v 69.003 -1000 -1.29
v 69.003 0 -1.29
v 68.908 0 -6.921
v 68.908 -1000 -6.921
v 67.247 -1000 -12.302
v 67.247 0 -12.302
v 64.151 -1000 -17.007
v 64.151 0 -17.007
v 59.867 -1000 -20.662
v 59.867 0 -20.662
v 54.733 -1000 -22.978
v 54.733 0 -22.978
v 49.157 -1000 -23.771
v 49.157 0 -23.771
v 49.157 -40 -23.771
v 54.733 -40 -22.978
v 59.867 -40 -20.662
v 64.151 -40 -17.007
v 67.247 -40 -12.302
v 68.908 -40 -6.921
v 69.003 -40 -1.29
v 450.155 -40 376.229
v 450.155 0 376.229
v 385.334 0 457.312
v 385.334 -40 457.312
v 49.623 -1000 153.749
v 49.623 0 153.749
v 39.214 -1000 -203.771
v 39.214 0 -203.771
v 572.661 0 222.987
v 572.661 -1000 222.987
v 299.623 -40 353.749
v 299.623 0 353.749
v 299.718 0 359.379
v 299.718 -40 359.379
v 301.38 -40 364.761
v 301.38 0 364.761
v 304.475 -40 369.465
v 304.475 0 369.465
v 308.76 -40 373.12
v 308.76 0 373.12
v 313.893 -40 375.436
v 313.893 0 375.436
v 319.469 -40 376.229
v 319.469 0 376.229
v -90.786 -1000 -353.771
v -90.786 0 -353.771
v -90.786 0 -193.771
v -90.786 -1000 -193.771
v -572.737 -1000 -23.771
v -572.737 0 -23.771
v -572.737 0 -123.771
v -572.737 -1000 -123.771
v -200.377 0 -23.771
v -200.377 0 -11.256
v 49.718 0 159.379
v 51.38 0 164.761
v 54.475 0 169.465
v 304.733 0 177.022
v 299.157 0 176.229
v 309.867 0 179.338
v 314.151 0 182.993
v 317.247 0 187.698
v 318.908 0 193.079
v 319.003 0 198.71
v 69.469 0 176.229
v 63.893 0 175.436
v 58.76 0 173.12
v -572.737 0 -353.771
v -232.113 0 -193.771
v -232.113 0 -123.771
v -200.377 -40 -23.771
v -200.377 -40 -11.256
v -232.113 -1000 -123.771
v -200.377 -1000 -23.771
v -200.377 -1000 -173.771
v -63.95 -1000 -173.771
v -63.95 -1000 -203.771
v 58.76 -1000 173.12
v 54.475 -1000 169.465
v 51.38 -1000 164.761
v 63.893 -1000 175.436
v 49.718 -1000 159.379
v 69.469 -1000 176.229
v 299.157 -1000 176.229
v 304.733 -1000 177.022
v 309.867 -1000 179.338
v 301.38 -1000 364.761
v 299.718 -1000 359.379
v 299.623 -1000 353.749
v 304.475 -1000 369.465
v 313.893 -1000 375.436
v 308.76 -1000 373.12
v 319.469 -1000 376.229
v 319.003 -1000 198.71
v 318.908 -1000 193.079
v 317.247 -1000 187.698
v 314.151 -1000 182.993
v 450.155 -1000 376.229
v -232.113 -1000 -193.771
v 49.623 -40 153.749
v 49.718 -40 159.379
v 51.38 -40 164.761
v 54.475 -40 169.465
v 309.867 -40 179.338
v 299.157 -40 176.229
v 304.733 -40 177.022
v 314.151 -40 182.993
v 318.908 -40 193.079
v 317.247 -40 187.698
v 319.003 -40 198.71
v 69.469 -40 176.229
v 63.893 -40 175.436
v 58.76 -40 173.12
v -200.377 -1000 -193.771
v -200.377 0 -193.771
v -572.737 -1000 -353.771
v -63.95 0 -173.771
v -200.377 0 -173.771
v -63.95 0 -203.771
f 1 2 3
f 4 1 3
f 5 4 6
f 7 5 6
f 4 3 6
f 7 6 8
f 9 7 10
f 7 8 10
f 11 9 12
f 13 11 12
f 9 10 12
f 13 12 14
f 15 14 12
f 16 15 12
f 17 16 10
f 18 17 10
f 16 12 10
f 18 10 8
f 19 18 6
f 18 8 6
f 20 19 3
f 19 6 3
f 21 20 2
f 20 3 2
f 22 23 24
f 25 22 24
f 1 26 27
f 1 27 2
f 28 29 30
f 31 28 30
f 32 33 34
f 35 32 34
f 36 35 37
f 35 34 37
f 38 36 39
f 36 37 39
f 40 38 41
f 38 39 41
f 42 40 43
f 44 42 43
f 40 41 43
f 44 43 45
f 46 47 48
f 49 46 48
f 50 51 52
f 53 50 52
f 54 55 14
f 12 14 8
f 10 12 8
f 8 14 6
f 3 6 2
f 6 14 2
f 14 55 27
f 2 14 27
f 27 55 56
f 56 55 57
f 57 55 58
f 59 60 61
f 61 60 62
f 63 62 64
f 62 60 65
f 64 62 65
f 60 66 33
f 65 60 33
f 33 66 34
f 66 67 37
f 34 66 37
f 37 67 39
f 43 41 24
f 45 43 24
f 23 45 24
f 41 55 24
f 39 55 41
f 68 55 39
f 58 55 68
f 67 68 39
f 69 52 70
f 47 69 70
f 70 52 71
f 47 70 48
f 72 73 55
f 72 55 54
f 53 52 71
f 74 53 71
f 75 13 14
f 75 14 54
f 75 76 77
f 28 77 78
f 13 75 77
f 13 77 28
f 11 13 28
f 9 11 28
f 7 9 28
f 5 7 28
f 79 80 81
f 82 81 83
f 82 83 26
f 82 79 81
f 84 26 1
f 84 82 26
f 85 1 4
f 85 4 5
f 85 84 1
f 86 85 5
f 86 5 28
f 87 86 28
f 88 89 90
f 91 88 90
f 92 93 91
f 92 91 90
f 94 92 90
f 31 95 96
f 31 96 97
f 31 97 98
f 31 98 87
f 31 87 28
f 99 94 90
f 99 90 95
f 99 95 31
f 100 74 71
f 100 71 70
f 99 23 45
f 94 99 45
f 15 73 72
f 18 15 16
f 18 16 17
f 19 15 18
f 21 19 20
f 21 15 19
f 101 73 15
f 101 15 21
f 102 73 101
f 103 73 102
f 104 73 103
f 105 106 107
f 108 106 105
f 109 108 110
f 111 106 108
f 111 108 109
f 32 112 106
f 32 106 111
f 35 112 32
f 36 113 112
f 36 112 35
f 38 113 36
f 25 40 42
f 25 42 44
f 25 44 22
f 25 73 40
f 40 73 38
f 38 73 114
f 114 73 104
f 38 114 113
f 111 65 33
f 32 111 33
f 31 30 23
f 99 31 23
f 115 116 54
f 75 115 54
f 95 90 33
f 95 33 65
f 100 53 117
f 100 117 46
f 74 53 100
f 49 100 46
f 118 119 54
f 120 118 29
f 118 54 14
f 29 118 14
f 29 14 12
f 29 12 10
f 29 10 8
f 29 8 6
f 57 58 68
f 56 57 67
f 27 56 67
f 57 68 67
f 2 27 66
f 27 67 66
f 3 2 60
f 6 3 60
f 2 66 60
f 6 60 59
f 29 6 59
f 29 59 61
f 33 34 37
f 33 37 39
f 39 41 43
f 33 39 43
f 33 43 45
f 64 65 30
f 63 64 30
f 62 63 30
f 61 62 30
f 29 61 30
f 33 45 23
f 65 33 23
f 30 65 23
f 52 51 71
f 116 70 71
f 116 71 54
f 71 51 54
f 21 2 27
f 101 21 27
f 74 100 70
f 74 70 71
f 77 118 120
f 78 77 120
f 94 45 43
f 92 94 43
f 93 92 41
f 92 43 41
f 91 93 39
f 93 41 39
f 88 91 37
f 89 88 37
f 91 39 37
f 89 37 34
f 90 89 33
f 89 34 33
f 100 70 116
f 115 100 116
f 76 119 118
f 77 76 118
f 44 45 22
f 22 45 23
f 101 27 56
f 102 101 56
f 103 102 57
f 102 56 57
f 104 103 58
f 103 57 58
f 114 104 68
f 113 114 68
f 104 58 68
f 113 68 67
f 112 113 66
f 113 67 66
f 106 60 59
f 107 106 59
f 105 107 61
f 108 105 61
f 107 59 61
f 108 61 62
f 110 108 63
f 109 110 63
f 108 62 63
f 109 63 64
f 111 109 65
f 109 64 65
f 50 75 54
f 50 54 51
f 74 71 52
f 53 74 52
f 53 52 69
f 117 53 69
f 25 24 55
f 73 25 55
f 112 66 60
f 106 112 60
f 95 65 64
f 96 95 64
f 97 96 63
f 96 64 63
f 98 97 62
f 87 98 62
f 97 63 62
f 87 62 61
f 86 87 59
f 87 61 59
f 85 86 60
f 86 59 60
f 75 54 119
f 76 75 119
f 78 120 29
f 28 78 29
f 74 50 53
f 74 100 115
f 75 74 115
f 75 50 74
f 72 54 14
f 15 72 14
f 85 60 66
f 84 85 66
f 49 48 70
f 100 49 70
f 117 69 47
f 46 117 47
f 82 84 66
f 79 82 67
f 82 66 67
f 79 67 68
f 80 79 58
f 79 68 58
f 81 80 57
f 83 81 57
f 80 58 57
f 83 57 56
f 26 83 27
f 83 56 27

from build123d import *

# Parameters (mm, degrees)
F0_W     = 481.9511
F0_H     = 50
F1_DEPTH = 1000
F2_DEPTH = 1000
F3_DEPTH = 1000
F4_DEPTH = 40


# Not quite as in the source:
# - ends of sketch curves that miss each other by under 0.0002 mm in the source are joined


with BuildPart() as f1:
    # F0 (on Front) → F1 (new body)
    with BuildSketch(Plane.XZ):
        Polygon((-90.785567, -193.770768), (-200.376776, -193.770768), (-232.113212, -193.770768), (-232.113212, -123.770768), (-572.736667, -123.770768), (-572.736667, -303.770768), (-90.785567, -303.770768), align=None)
        with Locations((-331.761117, -328.770768)):
            Rectangle(F0_W, F0_H)
    extrude(amount=F1_DEPTH)


with BuildPart() as f2:
    # F0 (on Front) → F2 (new body)
    with BuildSketch(Plane.XZ):
        Polygon((-200.376776, -173.770768), (-200.376776, -23.770768), (-572.736667, -23.770768), (-572.736667, -123.770768), (-232.113212, -123.770768), (-232.113212, -193.770768), (-200.376776, -193.770768), align=None)
    extrude(amount=F2_DEPTH)


with BuildPart() as f3:
    # F0 (on Front) → F3 (new body)
    with BuildSketch(Plane.XZ):
        with BuildLine():
            Line((49.157493, -23.770768), (-200.376776, -23.770768))
            Line((-200.376776, -23.770768), (-200.376776, -173.770768))
            Line((-200.376776, -173.770768), (-90.785567, -173.770768))
            Line((-90.785567, -173.770768), (-63.950427, -173.770768))
            Line((-63.950427, -173.770768), (-63.950427, -203.770768))
            Line((-63.950427, -203.770768), (39.214433, -203.770768))
            Line((39.214433, -203.770768), (226.7144330686, -53.7707680857))
            Line((226.7144330686, -53.7707680857), (572.661266, 222.986698))
            Line((572.661266, 222.986698), (450.1545409622, 376.2292319698))
            Line((450.1545409622, 376.2292319698), (319.468781, 376.229232))
            ThreePointArc((319.468781, 376.229232), (304.4752173606, 369.4652831252), (299.6232235119, 353.748536939))
            Line((299.6232235119, 353.748536939), (319.00305, 198.709926))
            ThreePointArc((319.00305, 198.709926), (314.1510563111, 182.9931805028), (299.157493, 176.229232))
            Line((299.157493, 176.229232), (69.468781, 176.229232))
            ThreePointArc((69.468781, 176.229232), (54.4752173606, 169.4652831252), (49.6232235119, 153.748536939))
            Line((49.6232235119, 153.748536939), (69.00305, -1.290074))
            ThreePointArc((69.00305, -1.290074), (64.1510563111, -17.0068194972), (49.157493, -23.770768))
        make_face()
    extrude(amount=F3_DEPTH)


with BuildPart() as f4:
    # F0 (on Front) → F4 (new body)
    with BuildSketch(Plane.XZ):
        with BuildLine():
            Line((-200.376776, -11.256305), (-200.376776, -23.770768))
            Line((-200.376776, -23.770768), (49.157493, -23.770768))
            ThreePointArc((49.157493, -23.770768), (64.1510563111, -17.0068194972), (69.0030506112, -1.2900739236))
            Line((69.0030506112, -1.2900739236), (49.623224, 153.748537))
            ThreePointArc((49.623224, 153.748537), (54.4752173606, 169.4652831252), (69.468781, 176.229232))
            Line((69.468781, 176.229232), (299.157493, 176.229232))
            ThreePointArc((299.157493, 176.229232), (314.1510563111, 182.9931805028), (319.0030506112, 198.7099260764))
            Line((319.0030506112, 198.7099260764), (299.623224, 353.748537))
            ThreePointArc((299.623224, 353.748537), (304.4752173606, 369.4652831252), (319.468781, 376.229232))
            Line((319.468781, 376.229232), (450.154541, 376.229232))
            Line((450.154541, 376.229232), (385.3341629587, 457.312445967))
            Line((385.3341629587, 457.312445967), (-200.376776, -11.256305))
        make_face()
    extrude(amount=F4_DEPTH)


solid = Compound([f1.part, f2.part, f3.part, f4.part])
